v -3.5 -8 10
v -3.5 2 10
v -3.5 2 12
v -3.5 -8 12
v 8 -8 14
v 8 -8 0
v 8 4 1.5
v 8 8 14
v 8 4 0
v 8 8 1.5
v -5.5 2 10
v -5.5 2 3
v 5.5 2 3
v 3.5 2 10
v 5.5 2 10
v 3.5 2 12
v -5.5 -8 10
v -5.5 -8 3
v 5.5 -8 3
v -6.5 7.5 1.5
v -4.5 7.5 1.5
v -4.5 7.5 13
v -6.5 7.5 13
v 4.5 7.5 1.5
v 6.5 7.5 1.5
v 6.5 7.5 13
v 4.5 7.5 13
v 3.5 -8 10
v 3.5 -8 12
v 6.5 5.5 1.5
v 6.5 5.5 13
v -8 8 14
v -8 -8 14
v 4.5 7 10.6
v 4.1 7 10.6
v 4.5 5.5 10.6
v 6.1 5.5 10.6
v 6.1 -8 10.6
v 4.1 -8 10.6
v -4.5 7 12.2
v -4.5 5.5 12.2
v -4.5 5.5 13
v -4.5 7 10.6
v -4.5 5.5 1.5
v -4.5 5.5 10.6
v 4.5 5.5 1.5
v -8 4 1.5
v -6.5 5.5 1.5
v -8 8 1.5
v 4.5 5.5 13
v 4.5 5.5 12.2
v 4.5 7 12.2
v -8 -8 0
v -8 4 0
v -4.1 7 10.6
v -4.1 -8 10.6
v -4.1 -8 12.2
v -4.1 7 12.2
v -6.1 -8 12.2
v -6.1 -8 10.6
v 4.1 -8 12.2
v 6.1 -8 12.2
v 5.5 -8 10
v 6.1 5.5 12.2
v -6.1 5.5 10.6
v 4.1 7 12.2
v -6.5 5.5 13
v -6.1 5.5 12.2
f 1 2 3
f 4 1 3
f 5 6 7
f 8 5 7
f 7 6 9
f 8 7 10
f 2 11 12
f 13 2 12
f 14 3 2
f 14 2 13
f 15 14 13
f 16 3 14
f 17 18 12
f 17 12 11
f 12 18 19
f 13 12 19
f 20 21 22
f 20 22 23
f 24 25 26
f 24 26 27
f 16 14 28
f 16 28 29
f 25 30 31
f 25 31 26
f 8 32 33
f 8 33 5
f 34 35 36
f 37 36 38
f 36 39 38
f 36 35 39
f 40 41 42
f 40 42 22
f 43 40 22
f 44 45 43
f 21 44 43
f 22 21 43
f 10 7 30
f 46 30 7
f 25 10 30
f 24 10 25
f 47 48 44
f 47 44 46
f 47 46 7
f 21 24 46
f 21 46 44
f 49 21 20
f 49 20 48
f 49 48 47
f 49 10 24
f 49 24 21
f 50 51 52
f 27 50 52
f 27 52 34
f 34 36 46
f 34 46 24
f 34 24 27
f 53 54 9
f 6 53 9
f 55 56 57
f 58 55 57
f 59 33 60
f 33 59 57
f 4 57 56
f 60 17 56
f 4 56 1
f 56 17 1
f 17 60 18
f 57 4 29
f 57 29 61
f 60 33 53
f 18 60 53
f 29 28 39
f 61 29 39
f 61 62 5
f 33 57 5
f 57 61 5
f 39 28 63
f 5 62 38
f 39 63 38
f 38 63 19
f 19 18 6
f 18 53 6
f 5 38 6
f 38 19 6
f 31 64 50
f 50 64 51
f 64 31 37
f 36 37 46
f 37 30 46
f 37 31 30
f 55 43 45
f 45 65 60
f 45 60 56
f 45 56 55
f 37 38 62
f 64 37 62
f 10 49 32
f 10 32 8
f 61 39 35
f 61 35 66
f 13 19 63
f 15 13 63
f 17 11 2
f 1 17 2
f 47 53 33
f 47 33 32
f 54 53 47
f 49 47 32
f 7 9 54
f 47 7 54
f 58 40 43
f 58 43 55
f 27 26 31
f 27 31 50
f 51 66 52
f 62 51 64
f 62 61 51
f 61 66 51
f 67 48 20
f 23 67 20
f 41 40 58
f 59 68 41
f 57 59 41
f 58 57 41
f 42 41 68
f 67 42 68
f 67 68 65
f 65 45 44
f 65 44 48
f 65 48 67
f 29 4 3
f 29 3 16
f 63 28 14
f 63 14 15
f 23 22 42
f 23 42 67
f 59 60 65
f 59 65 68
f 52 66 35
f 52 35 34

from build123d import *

# Parameters (mm, degrees)
SKIZZE1_W                       = 16
SKIZZE1_H                       = 16
AUFSATZ_LINEAR_AUSTRAGEN1_DEPTH = 14
SKIZZE2_W                       = 11
SKIZZE2_H                       = 7
SCHNITT_LINEAR_AUSTRAGEN1_DEPTH = 10
SKIZZE3_W                       = 7
SKIZZE3_H                       = 2
SCHNITT_LINEAR_AUSTRAGEN2_DEPTH = 10
SKIZZE4_W                       = 2
SKIZZE4_H                       = 1.6
SCHNITT_LINEAR_AUSTRAGEN3_DEPTH = 15
SKIZZE5_W                       = 16
SKIZZE5_H                       = 4
SCHNITT_LINEAR_AUSTRAGEN5_DEPTH = 1.5
SKIZZE6_W                       = 2
SKIZZE6_H                       = 2
SCHNITT_LINEAR_AUSTRAGEN6_DEPTH = 11.5


with BuildPart() as part:
    # Skizze1 → Aufsatz-Linear austragen1 (new body)
    with BuildSketch(Plane.XY):
        Rectangle(SKIZZE1_W, SKIZZE1_H)
    extrude(amount=AUFSATZ_LINEAR_AUSTRAGEN1_DEPTH)

    # Skizze2 → Schnitt-Linear austragen1 (cut)
    with BuildSketch(Plane.XZ.offset(8)):
        with Locations((0, 6.5)):
            Rectangle(SKIZZE2_W, SKIZZE2_H)
    extrude(amount=-SCHNITT_LINEAR_AUSTRAGEN1_DEPTH, mode=Mode.SUBTRACT)

    # Skizze3 → Schnitt-Linear austragen2 (cut)
    with BuildSketch(Plane.XZ.offset(8)):
        with Locations((0, 11)):
            Rectangle(SKIZZE3_W, SKIZZE3_H)
    extrude(amount=-SCHNITT_LINEAR_AUSTRAGEN2_DEPTH, mode=Mode.SUBTRACT)

    # Skizze4 → Schnitt-Linear austragen3 (cut)
    with BuildSketch(Plane.XZ.offset(8)):
        with Locations((5.1, 11.4)):
            Rectangle(SKIZZE4_W, SKIZZE4_H)
        with Locations((-5.1, 11.4)):
            Rectangle(SKIZZE4_W, SKIZZE4_H)
    extrude(amount=-SCHNITT_LINEAR_AUSTRAGEN3_DEPTH, mode=Mode.SUBTRACT)

    # Skizze5 → Schnitt-Linear austragen5 (cut)
    with BuildSketch(Plane(origin=(0, 0, 0), x_dir=(-1, 0, 0), z_dir=(0, 0, -1))):
        with Locations((0, 6)):
            Rectangle(SKIZZE5_W, SKIZZE5_H)
    extrude(amount=-SCHNITT_LINEAR_AUSTRAGEN5_DEPTH, mode=Mode.SUBTRACT)

    # Skizze6 → Schnitt-Linear austragen6 (cut)
    with BuildSketch(Plane(origin=(0, 0, 1.5), x_dir=(-1, 0, 0), z_dir=(0, 0, -1))):
        with Locations((-5.5, 6.5)):
            Rectangle(SKIZZE6_W, SKIZZE6_H)
        with Locations((5.5, 6.5)):
            Rectangle(SKIZZE6_W, SKIZZE6_H)
    extrude(amount=-SCHNITT_LINEAR_AUSTRAGEN6_DEPTH, mode=Mode.SUBTRACT)


solid = part.part
